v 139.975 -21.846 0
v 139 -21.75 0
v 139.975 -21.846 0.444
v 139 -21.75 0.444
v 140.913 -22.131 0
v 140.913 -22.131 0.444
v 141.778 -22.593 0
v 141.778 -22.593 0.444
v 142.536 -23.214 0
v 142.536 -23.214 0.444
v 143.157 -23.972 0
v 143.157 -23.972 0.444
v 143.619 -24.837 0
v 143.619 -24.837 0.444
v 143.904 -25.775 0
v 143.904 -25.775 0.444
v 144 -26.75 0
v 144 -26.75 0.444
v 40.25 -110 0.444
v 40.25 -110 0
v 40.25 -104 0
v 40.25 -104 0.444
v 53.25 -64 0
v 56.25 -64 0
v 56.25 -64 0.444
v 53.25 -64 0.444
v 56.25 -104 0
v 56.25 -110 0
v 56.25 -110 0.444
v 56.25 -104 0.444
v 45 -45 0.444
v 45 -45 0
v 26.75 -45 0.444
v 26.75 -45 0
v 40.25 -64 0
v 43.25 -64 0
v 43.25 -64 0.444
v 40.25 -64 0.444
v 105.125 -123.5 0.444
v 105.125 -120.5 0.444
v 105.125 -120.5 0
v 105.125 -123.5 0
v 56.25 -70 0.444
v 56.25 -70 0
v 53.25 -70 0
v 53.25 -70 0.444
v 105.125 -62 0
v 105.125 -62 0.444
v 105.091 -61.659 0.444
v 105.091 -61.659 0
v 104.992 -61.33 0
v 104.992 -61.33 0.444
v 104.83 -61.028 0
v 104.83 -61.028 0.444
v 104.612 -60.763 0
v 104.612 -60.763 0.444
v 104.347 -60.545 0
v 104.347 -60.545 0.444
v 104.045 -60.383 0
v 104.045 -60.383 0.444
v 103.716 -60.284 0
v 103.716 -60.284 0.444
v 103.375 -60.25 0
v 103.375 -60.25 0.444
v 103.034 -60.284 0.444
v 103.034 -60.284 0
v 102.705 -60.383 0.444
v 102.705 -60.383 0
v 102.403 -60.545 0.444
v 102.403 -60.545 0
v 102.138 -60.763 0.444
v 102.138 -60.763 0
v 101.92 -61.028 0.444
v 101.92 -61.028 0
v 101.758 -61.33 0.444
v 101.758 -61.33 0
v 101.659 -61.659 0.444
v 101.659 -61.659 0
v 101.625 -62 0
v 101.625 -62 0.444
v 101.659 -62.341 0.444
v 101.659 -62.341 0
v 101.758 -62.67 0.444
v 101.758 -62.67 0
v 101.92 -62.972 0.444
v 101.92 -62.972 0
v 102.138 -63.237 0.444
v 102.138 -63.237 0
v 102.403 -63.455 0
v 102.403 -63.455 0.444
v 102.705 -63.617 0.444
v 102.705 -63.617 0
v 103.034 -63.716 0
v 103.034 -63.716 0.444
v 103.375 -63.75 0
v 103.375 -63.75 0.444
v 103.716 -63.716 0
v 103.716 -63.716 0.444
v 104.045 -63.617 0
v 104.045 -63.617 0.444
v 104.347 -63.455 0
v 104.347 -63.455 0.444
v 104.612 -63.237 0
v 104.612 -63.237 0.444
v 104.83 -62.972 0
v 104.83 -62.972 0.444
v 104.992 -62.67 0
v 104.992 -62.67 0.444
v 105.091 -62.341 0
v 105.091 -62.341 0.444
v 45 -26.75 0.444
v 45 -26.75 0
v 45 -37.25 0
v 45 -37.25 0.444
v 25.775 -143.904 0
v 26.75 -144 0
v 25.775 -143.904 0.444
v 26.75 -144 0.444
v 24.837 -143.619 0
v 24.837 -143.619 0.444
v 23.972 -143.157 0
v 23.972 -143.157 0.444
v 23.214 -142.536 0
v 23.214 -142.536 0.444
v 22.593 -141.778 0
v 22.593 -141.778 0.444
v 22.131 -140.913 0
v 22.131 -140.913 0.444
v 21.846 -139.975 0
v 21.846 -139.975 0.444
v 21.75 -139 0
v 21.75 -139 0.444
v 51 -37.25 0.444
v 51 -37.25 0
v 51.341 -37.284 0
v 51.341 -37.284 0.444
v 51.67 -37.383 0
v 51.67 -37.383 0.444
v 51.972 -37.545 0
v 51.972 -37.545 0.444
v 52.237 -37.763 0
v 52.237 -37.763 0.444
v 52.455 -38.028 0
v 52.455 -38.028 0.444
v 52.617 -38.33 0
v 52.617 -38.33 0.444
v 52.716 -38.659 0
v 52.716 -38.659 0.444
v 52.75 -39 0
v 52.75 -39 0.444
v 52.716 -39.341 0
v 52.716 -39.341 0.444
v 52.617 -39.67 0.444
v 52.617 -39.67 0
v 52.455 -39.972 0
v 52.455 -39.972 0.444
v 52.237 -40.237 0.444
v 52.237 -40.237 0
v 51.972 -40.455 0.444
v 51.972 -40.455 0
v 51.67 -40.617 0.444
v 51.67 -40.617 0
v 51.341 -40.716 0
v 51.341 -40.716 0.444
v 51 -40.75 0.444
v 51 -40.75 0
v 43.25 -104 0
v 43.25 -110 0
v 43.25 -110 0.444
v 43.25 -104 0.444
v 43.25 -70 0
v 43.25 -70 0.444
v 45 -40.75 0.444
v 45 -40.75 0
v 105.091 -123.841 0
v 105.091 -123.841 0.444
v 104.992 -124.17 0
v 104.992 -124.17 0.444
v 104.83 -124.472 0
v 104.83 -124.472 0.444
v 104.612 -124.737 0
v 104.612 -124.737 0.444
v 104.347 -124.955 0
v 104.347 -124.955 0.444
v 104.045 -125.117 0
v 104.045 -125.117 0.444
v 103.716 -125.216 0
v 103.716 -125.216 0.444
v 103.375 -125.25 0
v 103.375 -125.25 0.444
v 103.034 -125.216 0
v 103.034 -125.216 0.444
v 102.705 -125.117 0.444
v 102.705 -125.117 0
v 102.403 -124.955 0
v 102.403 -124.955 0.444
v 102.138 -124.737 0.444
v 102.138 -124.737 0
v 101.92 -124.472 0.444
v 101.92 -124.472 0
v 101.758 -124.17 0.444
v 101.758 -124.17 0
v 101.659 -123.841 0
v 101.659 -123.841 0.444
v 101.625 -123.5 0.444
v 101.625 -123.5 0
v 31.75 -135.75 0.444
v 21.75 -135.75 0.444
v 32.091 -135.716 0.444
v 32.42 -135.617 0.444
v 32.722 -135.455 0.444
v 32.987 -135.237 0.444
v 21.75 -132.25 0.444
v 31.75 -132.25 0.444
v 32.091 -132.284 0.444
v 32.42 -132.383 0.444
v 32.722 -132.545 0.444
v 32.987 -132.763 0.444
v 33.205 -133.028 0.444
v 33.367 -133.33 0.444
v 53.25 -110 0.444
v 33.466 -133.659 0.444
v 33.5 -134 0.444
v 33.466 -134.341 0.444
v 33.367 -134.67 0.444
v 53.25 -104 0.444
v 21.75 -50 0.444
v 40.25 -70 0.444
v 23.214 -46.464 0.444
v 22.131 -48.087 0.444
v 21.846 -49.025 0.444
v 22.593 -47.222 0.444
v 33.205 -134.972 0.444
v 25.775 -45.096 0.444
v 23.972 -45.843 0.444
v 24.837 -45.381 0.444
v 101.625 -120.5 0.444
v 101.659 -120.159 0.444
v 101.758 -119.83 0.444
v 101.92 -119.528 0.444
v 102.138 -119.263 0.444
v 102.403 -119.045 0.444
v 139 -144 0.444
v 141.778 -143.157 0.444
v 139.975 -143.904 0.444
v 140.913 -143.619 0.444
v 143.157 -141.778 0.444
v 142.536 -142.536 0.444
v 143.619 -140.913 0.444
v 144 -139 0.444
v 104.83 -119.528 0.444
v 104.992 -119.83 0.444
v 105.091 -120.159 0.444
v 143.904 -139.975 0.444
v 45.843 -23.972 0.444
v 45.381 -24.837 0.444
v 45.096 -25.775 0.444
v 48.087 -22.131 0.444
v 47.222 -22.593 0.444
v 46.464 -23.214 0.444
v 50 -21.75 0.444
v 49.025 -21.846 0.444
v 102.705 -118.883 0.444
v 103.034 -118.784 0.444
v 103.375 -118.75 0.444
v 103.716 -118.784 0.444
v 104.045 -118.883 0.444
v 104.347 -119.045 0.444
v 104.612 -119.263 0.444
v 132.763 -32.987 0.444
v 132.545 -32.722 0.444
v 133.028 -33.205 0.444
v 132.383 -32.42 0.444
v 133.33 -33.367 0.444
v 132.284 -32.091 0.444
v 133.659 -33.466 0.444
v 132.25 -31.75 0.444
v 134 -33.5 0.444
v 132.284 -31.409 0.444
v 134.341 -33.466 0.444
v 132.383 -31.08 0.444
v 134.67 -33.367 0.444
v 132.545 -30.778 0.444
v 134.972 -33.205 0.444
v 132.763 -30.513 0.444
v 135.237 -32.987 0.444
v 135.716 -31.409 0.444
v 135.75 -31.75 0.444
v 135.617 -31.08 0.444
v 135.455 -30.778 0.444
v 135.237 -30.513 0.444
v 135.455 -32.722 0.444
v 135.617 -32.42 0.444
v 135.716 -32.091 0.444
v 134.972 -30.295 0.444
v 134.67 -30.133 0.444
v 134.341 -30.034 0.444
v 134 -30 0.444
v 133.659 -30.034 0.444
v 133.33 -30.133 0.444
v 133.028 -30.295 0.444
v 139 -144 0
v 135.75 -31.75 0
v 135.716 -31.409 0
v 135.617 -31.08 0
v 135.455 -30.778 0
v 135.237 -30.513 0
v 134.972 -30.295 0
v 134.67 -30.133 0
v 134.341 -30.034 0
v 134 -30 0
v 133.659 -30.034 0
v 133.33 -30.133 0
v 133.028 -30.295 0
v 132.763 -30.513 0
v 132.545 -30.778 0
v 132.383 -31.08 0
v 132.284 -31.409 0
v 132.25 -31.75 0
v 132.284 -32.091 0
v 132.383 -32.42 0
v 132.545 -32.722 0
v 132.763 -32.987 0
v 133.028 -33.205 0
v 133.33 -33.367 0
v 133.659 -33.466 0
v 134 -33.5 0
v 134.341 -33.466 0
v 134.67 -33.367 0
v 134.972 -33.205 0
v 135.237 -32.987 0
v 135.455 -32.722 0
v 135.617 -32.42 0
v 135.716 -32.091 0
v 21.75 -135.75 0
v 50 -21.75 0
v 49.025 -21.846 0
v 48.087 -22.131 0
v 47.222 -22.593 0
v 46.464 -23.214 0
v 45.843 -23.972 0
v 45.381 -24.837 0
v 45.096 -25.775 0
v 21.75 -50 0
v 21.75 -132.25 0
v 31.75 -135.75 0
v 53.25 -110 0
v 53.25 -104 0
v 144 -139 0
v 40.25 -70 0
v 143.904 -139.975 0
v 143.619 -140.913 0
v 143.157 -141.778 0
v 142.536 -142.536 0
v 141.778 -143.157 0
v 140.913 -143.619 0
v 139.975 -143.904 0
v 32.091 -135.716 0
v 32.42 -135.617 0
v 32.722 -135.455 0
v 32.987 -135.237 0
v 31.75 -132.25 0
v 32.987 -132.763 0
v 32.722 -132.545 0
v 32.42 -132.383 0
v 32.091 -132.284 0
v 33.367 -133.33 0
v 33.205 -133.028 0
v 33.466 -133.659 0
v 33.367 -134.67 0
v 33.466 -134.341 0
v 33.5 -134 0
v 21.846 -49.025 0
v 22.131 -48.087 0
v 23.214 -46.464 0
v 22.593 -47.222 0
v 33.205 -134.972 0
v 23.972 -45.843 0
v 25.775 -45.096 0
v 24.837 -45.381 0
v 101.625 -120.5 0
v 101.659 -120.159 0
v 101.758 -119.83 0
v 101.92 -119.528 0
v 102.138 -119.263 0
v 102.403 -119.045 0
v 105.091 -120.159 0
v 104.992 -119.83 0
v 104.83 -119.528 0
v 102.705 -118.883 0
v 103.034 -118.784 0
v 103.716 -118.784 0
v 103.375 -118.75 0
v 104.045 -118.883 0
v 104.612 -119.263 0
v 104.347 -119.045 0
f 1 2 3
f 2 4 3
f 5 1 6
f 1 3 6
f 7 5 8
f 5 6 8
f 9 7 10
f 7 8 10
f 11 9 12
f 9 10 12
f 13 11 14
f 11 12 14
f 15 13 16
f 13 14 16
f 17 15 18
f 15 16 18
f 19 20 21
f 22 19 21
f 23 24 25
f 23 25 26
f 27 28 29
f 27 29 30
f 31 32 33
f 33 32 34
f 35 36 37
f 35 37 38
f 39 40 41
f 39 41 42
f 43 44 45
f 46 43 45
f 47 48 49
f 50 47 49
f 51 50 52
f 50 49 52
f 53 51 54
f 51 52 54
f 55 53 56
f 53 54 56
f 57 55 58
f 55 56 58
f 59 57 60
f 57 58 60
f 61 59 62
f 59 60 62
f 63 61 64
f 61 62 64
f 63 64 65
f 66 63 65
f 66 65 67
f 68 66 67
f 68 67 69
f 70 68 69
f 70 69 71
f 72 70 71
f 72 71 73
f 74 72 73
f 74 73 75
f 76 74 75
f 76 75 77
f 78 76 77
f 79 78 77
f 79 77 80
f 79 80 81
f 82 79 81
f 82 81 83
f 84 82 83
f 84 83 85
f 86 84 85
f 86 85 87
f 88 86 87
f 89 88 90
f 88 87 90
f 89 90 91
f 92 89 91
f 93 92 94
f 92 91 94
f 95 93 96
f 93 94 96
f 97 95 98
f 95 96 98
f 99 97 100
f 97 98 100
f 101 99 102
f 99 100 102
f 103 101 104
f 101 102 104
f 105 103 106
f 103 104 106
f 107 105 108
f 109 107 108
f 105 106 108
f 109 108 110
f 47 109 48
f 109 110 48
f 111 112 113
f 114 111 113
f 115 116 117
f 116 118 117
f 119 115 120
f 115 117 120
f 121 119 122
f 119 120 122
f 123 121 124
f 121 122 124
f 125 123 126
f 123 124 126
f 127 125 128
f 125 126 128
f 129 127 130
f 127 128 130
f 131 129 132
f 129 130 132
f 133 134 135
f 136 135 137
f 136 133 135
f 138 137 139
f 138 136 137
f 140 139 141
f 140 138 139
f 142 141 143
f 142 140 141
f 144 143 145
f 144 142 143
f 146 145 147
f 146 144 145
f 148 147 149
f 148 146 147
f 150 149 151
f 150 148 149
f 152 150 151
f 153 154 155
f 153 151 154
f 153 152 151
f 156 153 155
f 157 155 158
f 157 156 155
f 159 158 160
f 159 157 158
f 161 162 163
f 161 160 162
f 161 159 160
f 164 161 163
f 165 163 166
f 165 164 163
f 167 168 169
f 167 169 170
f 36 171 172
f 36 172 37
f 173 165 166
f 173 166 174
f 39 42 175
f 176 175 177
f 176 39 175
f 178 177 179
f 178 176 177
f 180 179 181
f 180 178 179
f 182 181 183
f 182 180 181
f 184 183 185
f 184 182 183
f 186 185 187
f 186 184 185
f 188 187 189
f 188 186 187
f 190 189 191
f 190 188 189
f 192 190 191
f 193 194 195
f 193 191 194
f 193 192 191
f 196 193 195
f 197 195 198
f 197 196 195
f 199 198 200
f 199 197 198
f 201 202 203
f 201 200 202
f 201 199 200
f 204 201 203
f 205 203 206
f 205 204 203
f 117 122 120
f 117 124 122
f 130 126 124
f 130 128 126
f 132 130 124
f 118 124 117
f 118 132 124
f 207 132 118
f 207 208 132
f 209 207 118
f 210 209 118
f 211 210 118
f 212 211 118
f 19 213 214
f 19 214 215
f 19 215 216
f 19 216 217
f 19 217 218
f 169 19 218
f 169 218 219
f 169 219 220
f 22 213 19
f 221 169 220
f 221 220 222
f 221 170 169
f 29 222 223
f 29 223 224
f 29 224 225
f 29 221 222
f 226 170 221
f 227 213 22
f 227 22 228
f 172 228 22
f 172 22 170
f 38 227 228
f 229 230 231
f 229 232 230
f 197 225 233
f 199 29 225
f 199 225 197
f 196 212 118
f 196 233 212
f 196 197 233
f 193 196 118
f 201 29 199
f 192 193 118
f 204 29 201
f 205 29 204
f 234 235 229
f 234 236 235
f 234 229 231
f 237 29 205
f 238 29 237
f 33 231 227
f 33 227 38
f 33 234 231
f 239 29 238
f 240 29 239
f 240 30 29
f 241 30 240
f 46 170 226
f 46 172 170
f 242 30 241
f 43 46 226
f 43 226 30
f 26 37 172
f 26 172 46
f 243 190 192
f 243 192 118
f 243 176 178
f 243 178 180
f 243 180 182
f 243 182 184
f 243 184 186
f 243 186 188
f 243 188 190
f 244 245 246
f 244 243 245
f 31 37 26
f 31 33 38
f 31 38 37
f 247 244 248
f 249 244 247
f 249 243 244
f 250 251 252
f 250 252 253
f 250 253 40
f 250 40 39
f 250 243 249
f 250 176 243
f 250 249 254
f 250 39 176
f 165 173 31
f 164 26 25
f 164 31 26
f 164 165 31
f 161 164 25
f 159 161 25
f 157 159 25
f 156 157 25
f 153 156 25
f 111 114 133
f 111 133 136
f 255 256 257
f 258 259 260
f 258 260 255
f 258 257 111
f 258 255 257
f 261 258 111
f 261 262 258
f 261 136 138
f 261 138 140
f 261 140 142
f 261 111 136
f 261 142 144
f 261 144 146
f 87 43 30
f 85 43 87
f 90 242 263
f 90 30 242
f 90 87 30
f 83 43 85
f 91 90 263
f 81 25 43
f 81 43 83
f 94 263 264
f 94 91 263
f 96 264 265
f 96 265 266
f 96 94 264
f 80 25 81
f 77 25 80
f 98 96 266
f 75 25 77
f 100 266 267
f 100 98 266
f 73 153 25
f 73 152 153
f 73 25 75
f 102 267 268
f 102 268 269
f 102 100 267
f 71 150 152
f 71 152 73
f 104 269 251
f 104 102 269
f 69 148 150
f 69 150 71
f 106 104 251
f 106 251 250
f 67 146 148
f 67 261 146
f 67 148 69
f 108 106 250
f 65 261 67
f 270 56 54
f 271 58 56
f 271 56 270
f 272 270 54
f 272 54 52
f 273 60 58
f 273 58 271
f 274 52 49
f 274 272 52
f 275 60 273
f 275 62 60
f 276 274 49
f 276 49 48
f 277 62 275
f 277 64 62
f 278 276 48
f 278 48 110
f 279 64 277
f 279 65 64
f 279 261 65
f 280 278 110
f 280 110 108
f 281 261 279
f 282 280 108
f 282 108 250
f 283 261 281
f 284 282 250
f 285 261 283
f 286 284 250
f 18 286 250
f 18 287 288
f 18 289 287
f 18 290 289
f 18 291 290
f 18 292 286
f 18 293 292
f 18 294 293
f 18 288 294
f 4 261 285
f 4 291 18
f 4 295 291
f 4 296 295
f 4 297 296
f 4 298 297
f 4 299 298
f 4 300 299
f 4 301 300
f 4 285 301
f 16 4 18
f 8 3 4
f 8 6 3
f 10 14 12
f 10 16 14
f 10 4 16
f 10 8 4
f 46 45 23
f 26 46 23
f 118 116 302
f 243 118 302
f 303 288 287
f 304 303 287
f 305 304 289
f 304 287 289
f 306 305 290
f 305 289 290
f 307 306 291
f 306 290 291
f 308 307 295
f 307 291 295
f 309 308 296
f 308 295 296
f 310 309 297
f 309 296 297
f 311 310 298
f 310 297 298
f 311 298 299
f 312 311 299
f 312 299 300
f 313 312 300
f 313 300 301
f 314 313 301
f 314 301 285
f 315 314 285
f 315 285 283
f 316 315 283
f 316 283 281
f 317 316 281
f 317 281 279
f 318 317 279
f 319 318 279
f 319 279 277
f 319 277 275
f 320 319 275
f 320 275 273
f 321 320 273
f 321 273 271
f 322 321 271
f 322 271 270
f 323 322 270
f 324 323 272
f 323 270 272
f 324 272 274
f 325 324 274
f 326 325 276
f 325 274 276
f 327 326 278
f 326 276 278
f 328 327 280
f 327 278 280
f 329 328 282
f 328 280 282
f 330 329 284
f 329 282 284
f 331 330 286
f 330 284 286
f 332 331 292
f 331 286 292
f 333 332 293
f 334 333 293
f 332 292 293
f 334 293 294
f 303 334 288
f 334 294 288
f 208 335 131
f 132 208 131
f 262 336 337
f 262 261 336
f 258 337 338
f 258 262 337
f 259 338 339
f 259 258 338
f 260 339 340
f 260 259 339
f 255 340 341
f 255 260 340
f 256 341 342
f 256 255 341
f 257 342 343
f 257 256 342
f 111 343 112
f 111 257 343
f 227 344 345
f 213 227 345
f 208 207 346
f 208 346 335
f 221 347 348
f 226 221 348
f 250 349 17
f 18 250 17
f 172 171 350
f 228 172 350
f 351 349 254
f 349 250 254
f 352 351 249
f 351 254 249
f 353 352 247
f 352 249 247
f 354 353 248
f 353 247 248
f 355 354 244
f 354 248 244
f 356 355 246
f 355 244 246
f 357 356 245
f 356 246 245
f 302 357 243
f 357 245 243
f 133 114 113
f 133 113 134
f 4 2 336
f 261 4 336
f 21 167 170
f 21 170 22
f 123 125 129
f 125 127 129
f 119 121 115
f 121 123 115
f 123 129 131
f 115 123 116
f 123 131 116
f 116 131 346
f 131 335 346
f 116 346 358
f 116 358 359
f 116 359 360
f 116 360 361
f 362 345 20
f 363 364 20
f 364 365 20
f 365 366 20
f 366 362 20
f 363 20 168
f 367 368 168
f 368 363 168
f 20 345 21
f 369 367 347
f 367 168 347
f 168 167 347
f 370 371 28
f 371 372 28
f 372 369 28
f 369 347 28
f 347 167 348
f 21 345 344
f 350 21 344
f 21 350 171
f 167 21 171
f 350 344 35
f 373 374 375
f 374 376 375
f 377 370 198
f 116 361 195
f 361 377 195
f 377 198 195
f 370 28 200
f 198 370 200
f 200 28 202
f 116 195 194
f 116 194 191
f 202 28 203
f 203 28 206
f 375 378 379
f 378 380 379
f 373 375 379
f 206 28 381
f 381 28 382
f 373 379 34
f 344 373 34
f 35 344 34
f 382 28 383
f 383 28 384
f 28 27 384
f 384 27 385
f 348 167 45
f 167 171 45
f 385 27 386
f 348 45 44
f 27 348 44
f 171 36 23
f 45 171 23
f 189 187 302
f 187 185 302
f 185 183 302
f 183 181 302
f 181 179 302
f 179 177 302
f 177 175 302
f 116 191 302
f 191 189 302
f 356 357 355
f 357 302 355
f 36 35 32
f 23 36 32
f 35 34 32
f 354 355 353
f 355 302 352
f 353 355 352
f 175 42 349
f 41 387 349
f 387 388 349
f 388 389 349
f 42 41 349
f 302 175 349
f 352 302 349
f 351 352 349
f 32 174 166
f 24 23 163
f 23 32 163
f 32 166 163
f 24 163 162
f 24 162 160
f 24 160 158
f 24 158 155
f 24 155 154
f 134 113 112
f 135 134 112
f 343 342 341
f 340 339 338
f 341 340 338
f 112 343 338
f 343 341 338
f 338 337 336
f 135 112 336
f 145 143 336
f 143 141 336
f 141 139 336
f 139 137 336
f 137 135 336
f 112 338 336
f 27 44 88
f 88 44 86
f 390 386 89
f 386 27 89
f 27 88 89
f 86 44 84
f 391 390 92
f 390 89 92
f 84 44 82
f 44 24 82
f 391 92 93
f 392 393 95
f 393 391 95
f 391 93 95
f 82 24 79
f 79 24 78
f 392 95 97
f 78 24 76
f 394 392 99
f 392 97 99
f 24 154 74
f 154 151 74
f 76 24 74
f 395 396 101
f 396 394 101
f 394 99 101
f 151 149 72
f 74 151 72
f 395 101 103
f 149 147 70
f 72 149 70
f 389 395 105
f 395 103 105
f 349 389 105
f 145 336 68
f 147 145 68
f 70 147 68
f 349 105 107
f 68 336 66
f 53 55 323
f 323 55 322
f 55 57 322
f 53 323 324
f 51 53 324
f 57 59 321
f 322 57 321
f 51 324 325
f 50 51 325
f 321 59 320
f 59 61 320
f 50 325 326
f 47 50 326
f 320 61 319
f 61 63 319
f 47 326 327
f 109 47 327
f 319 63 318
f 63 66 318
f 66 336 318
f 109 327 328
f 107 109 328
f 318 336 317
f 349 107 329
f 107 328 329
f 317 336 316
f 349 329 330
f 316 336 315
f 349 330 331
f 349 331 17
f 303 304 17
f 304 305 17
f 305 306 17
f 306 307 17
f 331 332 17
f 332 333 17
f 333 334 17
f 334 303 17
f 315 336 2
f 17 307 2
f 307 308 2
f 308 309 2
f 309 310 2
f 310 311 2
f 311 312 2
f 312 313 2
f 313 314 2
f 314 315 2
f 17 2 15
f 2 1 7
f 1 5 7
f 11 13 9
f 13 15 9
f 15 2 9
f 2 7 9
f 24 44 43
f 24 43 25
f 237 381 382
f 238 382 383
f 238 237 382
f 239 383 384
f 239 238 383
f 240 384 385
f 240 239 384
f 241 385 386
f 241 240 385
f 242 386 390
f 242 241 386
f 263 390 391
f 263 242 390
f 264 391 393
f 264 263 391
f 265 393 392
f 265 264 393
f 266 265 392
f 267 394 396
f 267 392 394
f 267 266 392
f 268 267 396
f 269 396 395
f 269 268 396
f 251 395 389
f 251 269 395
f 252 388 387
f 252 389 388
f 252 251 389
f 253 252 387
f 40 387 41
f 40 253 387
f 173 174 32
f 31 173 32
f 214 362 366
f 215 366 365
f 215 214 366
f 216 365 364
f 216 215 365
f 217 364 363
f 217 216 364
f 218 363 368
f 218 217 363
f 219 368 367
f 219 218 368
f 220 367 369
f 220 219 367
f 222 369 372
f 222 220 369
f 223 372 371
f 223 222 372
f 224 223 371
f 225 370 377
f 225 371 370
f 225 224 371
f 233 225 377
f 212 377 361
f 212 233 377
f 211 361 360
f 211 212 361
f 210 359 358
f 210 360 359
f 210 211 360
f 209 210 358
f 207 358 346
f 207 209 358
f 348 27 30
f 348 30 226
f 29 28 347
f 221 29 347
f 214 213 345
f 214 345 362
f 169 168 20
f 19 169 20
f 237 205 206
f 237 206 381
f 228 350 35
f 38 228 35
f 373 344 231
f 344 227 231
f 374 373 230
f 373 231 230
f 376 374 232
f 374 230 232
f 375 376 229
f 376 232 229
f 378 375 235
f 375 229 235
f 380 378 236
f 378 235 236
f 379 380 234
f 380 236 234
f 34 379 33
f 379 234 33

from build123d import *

# Parameters (mm, degrees)
BOSS_EXTRUDE1_DEPTH = 0.4445
SKETCH2_R           = 1.75
CUT_EXTRUDE1_DEPTH  = 204.647238086
FILLET1_R           = 5
SKETCH3_W           = 3
SKETCH3_H           = 6
CUT_EXTRUDE2_DEPTH  = 204.647238086


with BuildPart() as part:
    # Sketch1 → Boss-Extrude1 (new body)
    with BuildSketch(Plane.XY):
        Polygon((144, -21.75), (45, -21.75), (45, -45), (21.75, -45), (21.75, -144), (144, -144), align=None)
    extrude(amount=BOSS_EXTRUDE1_DEPTH)

    # Sketch2 → Cut-Extrude1 (cut, through all)
    with BuildSketch(Plane.XY.offset(0.4445)):
        with Locations((134, -31.75)):
            Circle(SKETCH2_R)
        with Locations((103.375, -62)):
            Circle(SKETCH2_R)
        with BuildLine():
            Line((51, -40.75), (45, -40.75))
            ThreePointArc((45, -40.75), (43.25, -39), (45, -37.25))
            Line((45, -37.25), (51, -37.25))
            ThreePointArc((51, -37.25), (52.75, -39), (51, -40.75))
        make_face()
        with BuildLine():
            Line((31.75, -135.75), (21.75, -135.75))
            ThreePointArc((21.75, -135.75), (20, -134), (21.75, -132.25))
            Line((21.75, -132.25), (31.75, -132.25))
            ThreePointArc((31.75, -132.25), (33.5, -134), (31.75, -135.75))
        make_face()
        with BuildLine():
            Line((101.625, -123.5), (101.625, -120.5))
            ThreePointArc((101.625, -120.5), (103.375, -118.75), (105.125, -120.5))
            Line((105.125, -120.5), (105.125, -123.5))
            ThreePointArc((105.125, -123.5), (103.375, -125.25), (101.625, -123.5))
        make_face()
    extrude(amount=-CUT_EXTRUDE1_DEPTH, mode=Mode.SUBTRACT)

    # Fillet1
    fillet1_edges = [part.edges().sort_by_distance(p)[0] for p in [
        (144, -144, 0.22225),
        (21.75, -144, 0.22225),
        (21.75, -45, 0.22225),
        (45, -21.75, 0.22225),
        (144, -21.75, 0.22225),
    ]]
    fillet(fillet1_edges, radius=FILLET1_R)

    # Sketch3 → Cut-Extrude2 (cut, through all)
    with BuildSketch(Plane(origin=(0, 0, 0), x_dir=(-1, 0, 0), z_dir=(0, 0, -1))):
        with Locations((-41.75, -67)):
            Rectangle(SKETCH3_W, SKETCH3_H)
        with Locations((-54.75, -67)):
            Rectangle(SKETCH3_W, SKETCH3_H)
        with Locations((-41.75, -107)):
            Rectangle(SKETCH3_W, SKETCH3_H)
        with Locations((-54.75, -107)):
            Rectangle(SKETCH3_W, SKETCH3_H)
    extrude(amount=-CUT_EXTRUDE2_DEPTH, mode=Mode.SUBTRACT)


solid = part.part
